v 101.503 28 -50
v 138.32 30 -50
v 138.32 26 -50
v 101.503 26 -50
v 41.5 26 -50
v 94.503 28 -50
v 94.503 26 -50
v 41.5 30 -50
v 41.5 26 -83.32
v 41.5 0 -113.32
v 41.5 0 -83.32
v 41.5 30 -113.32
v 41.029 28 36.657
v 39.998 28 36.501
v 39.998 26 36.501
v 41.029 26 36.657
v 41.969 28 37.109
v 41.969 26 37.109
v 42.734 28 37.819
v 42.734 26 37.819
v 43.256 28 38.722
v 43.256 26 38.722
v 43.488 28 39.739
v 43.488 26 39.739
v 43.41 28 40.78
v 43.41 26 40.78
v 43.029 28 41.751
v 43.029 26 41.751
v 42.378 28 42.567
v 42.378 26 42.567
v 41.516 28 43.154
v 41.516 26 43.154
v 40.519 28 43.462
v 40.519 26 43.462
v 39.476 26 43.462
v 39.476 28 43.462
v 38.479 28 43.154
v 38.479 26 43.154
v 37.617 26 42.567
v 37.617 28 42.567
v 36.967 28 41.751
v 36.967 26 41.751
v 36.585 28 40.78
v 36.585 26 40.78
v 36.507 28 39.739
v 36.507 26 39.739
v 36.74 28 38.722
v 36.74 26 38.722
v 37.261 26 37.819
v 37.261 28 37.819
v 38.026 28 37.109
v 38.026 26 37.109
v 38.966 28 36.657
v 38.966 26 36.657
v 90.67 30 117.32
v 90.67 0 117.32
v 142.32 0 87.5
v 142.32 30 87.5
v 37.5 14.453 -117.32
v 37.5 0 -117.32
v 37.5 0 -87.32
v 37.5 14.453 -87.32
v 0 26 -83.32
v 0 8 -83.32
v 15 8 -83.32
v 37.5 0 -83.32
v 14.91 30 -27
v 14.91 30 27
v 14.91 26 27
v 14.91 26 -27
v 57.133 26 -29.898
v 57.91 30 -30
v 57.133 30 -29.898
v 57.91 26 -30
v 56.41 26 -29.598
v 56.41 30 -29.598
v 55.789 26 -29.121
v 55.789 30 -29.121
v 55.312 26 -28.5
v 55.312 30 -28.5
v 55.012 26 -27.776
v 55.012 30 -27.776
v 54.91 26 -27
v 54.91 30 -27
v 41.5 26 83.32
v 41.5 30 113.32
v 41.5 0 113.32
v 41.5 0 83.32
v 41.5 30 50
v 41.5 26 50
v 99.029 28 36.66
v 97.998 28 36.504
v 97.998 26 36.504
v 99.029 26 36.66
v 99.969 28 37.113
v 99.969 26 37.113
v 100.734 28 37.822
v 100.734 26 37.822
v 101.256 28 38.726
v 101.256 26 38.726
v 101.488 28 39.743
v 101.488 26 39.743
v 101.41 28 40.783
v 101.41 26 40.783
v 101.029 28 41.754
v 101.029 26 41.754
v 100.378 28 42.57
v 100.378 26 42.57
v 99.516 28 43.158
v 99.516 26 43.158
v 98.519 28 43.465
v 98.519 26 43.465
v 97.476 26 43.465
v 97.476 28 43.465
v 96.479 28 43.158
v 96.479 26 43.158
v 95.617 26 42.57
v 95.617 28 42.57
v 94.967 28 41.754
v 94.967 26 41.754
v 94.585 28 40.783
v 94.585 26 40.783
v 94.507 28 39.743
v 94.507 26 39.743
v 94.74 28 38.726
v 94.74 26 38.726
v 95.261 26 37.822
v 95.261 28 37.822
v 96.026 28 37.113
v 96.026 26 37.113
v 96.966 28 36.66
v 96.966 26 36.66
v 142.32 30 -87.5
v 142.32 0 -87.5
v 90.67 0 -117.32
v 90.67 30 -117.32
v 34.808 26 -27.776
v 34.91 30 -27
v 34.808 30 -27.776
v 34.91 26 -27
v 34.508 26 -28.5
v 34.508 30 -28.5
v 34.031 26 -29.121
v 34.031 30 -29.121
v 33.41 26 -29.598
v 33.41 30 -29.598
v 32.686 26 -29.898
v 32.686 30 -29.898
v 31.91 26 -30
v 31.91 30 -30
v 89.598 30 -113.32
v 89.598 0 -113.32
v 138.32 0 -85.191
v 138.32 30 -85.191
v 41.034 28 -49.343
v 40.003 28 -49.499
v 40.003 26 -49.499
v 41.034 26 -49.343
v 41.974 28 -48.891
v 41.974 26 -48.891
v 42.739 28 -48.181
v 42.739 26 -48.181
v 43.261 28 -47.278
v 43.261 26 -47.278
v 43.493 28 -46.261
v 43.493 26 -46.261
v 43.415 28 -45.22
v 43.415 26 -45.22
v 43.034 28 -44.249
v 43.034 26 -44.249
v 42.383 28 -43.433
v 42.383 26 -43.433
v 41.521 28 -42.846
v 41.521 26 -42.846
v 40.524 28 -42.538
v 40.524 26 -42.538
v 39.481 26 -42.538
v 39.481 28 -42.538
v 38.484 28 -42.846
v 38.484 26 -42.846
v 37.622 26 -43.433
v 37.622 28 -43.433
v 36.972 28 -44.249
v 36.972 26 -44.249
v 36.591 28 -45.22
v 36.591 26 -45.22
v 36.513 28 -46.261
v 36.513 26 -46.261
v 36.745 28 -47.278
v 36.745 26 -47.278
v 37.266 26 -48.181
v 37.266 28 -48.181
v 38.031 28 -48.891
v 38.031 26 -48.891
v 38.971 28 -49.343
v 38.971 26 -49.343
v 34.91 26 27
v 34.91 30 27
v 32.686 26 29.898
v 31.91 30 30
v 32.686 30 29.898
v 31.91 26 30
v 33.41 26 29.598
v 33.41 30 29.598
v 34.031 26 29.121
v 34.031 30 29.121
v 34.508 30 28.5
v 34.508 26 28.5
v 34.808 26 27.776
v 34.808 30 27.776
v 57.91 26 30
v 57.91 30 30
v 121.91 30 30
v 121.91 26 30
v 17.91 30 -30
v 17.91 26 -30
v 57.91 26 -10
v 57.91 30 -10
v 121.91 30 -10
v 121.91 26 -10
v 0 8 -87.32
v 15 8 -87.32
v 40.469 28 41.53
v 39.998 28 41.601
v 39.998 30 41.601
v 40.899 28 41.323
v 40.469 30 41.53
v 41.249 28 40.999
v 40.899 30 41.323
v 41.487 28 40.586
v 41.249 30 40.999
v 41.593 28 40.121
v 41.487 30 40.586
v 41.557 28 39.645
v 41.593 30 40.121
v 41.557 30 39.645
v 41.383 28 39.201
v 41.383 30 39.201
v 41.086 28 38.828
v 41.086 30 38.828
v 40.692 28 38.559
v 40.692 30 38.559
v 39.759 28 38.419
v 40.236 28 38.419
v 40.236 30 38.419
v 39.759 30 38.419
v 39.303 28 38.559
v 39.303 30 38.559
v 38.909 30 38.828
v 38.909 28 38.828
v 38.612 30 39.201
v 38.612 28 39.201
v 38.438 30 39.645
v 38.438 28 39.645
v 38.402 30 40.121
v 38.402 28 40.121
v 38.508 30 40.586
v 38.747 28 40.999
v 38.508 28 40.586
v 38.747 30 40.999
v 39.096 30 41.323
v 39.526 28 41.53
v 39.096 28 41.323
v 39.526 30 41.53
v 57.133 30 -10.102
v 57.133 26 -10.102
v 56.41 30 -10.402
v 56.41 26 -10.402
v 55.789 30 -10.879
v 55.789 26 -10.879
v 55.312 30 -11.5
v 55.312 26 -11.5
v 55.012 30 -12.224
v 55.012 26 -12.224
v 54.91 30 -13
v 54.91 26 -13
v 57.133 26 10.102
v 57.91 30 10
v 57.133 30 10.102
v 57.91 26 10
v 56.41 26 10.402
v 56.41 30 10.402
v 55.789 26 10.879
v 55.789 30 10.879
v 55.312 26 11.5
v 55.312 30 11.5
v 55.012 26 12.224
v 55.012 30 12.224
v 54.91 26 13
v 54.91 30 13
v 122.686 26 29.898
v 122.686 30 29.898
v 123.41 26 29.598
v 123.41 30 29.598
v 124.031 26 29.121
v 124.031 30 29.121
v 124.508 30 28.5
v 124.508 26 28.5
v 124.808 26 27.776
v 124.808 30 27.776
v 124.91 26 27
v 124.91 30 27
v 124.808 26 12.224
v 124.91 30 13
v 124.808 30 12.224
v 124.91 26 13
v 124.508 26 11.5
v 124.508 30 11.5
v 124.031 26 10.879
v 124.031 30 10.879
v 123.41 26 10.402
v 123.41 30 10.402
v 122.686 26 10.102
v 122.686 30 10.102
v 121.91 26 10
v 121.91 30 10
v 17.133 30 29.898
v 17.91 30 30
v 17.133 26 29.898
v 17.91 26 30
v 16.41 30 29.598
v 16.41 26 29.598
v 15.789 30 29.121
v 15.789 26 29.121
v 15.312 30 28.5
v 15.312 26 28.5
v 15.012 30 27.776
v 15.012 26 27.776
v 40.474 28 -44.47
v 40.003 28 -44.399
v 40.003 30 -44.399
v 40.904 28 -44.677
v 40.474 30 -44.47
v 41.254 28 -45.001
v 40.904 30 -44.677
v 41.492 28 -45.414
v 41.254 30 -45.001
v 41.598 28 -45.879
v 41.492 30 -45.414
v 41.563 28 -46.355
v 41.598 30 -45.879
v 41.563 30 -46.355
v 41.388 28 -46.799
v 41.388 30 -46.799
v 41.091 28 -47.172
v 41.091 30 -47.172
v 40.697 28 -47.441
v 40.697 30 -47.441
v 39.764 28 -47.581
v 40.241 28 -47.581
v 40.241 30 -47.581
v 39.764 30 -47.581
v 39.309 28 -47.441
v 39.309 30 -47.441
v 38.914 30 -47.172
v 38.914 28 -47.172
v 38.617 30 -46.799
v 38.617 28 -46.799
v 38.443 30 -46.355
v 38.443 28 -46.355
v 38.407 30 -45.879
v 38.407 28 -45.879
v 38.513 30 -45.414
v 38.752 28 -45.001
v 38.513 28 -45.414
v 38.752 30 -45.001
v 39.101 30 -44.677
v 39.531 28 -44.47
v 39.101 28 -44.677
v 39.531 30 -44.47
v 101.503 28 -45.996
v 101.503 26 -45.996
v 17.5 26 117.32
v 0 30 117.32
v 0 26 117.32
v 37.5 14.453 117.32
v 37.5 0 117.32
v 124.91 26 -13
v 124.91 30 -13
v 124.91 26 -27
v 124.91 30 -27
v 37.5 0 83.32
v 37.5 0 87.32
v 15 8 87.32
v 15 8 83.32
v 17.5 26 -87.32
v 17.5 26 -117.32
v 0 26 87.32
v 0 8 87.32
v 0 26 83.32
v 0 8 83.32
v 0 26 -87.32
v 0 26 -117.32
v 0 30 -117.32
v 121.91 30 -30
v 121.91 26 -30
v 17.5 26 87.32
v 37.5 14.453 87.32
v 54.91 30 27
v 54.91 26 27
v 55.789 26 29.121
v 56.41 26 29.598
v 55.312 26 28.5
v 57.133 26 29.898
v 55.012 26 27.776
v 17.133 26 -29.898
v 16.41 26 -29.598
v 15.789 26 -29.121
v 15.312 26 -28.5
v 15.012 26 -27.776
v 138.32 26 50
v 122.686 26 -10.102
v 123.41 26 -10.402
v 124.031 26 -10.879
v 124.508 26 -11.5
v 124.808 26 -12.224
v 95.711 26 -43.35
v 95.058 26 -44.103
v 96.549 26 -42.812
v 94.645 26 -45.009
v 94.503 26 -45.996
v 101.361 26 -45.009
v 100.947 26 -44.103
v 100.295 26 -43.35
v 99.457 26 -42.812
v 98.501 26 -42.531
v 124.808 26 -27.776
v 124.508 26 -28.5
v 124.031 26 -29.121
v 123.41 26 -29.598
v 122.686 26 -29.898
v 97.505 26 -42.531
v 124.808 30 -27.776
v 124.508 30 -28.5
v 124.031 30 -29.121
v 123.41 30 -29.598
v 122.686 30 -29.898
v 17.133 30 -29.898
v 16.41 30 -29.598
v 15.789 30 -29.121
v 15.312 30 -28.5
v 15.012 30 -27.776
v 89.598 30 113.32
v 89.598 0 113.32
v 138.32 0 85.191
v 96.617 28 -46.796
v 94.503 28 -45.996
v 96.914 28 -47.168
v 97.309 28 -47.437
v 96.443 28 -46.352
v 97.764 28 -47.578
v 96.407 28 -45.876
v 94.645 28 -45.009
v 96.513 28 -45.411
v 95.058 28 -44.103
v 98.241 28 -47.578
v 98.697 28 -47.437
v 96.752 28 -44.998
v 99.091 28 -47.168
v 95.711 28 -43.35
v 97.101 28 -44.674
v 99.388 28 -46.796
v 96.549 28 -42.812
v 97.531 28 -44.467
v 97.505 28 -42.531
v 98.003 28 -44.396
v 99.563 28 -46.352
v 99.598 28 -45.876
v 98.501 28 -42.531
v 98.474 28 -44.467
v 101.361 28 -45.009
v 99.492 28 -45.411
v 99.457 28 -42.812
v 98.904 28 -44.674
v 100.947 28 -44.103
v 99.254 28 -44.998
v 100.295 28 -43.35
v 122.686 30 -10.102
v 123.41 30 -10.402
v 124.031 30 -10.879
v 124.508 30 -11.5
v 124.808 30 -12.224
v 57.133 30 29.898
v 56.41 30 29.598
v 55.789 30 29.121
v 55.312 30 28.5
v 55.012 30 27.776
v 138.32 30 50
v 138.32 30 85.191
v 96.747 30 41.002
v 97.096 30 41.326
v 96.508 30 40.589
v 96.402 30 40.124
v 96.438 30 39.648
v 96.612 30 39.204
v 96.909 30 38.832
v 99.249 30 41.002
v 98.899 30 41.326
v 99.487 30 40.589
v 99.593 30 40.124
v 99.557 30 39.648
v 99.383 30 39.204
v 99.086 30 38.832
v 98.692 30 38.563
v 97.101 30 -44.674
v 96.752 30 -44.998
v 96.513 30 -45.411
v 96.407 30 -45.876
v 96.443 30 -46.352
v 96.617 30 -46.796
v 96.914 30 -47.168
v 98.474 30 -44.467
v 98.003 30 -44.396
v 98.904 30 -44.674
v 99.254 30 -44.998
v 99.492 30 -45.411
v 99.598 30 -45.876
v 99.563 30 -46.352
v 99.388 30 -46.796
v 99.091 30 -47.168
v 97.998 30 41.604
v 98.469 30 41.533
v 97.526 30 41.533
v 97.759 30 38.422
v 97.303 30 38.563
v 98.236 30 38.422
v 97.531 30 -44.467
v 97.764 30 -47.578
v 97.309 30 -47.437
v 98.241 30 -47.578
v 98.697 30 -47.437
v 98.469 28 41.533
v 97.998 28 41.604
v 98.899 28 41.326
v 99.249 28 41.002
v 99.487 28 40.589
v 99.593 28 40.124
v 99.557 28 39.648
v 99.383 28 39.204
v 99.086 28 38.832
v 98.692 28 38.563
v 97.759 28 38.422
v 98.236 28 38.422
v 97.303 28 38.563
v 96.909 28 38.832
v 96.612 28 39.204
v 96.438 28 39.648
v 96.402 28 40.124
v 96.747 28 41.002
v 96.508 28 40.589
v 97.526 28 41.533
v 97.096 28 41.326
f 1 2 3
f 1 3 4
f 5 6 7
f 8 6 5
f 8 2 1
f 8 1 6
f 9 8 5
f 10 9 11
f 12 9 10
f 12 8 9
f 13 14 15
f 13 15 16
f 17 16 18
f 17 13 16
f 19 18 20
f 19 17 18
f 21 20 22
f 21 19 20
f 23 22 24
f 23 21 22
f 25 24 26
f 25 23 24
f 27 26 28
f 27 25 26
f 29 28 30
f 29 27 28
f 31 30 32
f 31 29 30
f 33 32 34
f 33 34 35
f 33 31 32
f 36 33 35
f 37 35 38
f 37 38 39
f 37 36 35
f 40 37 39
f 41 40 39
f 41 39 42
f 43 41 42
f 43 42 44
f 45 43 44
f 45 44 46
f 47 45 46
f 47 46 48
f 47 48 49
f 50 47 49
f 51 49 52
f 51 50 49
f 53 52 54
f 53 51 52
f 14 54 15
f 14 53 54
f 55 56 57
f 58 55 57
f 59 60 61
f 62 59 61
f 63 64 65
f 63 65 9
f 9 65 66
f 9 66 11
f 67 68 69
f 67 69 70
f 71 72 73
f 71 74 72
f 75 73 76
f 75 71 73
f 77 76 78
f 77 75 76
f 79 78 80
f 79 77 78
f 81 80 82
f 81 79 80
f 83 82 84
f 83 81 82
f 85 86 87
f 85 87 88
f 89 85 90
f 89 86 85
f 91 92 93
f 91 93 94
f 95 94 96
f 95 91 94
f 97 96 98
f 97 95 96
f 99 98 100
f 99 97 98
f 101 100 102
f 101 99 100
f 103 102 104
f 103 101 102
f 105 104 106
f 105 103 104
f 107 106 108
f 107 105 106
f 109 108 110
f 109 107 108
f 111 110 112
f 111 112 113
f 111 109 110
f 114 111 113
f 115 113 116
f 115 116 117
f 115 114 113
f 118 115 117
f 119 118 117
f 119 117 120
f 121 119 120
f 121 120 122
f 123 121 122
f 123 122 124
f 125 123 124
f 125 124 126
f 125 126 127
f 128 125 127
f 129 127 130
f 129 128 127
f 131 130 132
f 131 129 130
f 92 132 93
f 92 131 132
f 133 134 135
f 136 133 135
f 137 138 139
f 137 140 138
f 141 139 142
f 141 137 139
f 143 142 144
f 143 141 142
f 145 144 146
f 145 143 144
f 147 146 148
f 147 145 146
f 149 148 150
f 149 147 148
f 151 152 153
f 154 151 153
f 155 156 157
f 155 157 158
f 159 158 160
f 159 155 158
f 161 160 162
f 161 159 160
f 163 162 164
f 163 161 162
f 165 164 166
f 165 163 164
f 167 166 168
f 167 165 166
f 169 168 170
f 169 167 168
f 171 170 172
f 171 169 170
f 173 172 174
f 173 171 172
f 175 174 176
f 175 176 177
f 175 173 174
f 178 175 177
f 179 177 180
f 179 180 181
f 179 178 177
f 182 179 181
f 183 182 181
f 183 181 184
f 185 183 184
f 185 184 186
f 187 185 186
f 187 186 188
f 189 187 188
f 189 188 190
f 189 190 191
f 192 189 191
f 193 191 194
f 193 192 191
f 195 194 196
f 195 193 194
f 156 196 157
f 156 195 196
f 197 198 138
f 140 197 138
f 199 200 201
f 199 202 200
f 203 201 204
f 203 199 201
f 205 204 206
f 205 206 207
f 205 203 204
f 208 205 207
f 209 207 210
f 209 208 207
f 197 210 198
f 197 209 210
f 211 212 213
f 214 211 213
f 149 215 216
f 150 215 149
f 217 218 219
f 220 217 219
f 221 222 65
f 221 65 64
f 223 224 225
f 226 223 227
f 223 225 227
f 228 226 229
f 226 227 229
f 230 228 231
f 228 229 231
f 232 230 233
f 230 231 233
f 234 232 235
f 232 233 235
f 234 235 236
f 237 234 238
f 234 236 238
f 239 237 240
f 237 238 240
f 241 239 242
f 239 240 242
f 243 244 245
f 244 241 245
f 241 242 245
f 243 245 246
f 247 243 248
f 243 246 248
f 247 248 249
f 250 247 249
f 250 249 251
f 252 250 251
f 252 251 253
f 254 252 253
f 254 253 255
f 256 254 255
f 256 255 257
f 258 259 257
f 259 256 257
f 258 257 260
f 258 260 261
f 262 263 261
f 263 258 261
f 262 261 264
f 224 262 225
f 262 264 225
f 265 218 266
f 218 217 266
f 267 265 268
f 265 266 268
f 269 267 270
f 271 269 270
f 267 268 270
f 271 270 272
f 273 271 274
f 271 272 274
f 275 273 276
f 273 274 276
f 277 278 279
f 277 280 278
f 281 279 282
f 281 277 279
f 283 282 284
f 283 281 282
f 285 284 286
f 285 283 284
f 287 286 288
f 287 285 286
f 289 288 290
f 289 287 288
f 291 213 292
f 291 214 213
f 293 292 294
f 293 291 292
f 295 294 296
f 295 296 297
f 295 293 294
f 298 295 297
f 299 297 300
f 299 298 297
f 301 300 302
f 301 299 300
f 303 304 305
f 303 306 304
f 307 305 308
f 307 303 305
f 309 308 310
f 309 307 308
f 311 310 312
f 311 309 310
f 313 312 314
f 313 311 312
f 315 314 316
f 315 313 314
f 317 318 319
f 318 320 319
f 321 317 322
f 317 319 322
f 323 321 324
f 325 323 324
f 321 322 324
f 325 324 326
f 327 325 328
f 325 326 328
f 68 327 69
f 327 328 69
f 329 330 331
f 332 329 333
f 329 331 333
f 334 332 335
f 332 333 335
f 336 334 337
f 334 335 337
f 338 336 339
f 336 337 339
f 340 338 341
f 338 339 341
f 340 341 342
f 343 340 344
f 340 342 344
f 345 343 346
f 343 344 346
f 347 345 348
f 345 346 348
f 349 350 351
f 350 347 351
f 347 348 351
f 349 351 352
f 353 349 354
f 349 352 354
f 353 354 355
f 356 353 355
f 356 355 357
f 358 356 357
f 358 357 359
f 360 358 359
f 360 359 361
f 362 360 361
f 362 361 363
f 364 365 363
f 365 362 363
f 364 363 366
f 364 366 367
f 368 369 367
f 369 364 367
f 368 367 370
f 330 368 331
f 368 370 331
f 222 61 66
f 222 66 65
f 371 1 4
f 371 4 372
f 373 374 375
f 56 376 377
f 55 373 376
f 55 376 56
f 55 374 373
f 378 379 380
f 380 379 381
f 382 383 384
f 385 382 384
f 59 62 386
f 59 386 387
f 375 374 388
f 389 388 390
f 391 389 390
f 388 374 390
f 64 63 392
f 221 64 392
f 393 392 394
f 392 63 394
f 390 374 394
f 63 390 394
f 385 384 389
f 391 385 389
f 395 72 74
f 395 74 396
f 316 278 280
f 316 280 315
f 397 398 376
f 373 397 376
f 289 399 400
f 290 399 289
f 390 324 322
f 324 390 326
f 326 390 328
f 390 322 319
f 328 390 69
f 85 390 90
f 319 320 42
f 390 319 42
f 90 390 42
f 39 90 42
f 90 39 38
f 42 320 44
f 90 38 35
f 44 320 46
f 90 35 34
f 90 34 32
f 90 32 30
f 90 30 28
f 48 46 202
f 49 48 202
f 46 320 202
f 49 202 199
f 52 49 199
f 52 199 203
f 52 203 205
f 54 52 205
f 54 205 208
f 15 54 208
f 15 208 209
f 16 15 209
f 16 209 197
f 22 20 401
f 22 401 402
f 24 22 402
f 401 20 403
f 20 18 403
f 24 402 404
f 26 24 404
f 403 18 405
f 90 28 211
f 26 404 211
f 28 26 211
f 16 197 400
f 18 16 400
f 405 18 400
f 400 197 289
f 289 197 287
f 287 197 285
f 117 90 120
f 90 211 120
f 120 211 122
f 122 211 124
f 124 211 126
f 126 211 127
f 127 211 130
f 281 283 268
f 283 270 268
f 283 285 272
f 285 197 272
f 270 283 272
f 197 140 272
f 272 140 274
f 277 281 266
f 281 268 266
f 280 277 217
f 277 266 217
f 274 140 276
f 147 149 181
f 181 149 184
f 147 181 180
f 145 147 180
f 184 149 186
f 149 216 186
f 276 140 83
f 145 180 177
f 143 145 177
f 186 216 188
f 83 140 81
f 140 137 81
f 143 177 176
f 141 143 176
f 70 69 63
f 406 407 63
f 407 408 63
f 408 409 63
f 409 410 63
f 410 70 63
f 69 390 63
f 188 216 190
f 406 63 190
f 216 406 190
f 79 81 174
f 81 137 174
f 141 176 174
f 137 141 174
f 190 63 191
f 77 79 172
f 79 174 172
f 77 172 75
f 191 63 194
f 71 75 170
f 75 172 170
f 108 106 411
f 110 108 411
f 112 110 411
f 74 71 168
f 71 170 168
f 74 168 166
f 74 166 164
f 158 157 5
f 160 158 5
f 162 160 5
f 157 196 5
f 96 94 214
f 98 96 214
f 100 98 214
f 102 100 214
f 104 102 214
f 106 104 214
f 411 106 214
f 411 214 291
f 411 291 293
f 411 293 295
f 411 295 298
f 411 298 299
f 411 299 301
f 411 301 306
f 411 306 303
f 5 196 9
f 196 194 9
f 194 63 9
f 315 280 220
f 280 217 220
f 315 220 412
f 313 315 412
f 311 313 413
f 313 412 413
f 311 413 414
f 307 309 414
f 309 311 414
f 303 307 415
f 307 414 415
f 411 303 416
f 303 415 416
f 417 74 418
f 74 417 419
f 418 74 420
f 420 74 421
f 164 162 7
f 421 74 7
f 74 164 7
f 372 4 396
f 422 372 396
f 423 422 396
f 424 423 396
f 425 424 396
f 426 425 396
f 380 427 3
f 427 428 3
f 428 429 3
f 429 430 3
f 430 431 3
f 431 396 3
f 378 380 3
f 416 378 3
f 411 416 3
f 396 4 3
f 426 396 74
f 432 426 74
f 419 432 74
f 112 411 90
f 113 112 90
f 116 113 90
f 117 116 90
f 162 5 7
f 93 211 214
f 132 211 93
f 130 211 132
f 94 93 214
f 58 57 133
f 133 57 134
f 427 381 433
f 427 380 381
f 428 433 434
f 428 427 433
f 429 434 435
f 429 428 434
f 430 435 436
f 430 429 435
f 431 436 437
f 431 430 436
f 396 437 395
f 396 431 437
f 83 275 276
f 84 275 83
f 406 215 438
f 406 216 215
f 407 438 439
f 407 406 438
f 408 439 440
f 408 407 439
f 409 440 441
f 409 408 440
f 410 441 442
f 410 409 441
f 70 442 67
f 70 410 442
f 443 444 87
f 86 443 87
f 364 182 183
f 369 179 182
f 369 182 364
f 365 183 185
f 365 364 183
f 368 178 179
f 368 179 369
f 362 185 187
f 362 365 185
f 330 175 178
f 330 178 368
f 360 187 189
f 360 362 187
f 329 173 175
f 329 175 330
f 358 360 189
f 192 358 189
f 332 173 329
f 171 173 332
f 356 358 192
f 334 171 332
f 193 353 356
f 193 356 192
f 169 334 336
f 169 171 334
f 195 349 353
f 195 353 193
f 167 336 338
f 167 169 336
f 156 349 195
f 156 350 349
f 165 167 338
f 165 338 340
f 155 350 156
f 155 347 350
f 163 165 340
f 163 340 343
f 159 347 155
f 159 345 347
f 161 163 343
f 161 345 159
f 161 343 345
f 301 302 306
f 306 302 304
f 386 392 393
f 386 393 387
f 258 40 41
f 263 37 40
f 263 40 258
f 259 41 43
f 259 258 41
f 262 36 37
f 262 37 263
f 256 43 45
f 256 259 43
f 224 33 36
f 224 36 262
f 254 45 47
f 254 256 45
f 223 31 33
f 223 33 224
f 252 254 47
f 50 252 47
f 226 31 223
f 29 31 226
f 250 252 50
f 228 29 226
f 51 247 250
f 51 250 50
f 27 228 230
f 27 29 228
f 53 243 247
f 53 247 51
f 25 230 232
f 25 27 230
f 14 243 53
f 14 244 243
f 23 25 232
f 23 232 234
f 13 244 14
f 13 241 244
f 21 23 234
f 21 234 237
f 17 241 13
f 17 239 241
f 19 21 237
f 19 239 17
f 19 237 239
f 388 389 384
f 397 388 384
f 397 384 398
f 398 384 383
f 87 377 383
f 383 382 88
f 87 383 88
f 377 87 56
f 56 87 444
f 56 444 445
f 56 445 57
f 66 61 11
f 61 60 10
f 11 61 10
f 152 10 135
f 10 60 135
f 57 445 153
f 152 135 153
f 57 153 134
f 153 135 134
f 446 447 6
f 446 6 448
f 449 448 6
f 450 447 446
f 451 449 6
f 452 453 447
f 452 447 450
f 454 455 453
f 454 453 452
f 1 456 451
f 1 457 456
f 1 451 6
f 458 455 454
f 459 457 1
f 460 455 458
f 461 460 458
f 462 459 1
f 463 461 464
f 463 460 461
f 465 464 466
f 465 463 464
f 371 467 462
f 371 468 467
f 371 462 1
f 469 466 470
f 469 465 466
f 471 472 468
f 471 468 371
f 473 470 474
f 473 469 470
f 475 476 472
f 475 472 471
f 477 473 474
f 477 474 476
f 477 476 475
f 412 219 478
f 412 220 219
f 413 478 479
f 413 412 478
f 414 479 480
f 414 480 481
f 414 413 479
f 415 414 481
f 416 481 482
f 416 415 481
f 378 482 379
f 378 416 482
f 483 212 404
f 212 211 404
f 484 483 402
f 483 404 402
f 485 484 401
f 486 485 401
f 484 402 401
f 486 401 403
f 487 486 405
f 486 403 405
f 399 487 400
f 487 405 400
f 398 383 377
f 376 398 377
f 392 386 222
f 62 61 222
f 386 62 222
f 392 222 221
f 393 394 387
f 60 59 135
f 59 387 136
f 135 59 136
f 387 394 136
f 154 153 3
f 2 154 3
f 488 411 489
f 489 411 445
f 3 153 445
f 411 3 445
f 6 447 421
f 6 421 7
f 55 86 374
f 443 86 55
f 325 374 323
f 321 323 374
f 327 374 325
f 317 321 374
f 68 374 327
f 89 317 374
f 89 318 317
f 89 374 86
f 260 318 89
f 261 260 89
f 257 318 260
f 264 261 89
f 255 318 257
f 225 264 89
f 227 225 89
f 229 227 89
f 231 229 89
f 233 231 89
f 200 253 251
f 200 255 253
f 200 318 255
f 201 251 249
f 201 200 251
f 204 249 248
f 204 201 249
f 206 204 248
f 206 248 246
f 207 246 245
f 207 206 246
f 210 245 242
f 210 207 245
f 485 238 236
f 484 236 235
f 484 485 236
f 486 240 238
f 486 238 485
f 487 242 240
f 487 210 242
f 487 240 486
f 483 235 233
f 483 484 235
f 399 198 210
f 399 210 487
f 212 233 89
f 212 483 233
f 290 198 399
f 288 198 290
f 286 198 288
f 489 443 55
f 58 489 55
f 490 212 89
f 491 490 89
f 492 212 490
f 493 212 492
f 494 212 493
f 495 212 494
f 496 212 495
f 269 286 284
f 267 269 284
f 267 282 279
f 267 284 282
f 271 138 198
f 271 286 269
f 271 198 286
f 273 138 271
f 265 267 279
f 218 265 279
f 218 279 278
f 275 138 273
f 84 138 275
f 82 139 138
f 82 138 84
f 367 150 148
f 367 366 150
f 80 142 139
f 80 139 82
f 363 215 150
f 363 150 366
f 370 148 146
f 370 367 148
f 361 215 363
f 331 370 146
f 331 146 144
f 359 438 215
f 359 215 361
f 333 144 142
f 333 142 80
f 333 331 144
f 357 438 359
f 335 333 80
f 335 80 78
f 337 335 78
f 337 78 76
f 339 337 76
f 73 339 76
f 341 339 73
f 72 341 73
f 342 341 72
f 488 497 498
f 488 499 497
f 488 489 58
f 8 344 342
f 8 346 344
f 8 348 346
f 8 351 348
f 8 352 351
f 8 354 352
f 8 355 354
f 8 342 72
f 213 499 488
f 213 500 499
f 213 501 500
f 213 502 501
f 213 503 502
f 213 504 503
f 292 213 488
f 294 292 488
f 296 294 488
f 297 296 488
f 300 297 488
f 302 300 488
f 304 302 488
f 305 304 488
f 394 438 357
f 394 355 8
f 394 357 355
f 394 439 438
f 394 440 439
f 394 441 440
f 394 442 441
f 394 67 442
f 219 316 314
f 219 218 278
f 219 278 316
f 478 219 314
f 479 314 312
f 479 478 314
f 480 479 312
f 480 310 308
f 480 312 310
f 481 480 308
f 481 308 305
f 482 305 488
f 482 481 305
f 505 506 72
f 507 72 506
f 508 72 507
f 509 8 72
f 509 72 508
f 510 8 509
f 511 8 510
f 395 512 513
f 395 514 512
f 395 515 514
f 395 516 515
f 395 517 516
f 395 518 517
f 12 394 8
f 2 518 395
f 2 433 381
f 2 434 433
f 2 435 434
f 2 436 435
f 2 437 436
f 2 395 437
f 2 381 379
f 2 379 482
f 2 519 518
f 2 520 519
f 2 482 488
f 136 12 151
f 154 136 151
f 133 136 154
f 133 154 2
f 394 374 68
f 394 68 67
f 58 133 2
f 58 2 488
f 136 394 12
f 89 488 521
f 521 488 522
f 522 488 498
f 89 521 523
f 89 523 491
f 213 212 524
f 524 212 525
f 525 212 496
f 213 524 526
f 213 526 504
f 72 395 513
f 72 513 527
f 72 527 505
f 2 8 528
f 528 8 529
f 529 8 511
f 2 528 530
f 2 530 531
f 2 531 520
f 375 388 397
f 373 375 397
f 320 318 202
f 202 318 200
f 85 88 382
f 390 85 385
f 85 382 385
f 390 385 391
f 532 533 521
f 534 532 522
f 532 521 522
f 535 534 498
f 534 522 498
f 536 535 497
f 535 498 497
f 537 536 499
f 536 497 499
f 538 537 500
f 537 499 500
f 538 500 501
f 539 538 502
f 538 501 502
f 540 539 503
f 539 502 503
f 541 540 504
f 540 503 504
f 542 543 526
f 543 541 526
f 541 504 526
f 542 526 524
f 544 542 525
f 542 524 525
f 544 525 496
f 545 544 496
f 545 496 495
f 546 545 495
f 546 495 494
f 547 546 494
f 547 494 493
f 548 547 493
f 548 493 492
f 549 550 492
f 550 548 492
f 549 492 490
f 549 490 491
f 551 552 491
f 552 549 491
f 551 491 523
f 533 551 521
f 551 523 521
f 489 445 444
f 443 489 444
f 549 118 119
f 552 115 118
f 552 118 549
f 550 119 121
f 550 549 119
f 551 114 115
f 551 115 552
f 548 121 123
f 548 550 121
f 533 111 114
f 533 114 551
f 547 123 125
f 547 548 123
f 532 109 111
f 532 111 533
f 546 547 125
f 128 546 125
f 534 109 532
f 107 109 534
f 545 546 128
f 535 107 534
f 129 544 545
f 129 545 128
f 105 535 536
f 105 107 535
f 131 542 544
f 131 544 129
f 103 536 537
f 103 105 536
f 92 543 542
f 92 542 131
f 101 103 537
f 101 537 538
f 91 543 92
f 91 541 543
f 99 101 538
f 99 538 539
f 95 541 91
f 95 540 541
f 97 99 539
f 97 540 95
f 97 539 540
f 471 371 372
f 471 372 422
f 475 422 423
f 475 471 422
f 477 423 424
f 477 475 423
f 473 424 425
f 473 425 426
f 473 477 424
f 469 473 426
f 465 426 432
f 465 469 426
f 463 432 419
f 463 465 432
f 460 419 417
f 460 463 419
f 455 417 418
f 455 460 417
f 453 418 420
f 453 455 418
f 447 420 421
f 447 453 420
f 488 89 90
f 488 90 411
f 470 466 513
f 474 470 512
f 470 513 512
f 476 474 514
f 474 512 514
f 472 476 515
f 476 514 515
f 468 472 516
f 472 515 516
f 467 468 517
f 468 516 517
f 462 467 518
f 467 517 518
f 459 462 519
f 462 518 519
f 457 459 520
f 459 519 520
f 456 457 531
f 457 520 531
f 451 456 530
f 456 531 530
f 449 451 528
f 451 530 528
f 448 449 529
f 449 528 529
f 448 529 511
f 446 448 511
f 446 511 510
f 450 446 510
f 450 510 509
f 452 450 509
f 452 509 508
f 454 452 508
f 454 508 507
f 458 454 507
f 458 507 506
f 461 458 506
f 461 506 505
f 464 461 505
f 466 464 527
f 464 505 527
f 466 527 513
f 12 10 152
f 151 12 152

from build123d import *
from OCP.BRepFilletAPI import BRepFilletAPI_MakeChamfer

# Parameters (mm, degrees)
BOSS_EXTRUDE1_DEPTH = 30
CUT_EXTRUDE1_REACH  = 253.063
SKETCH10_W          = 41.5
SKETCH10_H          = 34
BOSS_EXTRUDE3_DEPTH = 4
CHAMFER4_SIZE       = 20
CHAMFER4_SIZE2      = 11.547005384
SKETCH11_W          = 20.75
SKETCH11_H          = 166.64
BOSS_EXTRUDE4_DEPTH = 4
SKETCH12_W          = 20.75
SKETCH12_H          = 33.32
BOSS_EXTRUDE5_DEPTH = 4
SKETCH13_W          = 20
SKETCH13_H          = 60
SKETCH13_W_2        = 70
SKETCH13_H_2        = 20
CUT_EXTRUDE2_DEPTH  = 4
FILLET2_R           = 3
SKETCH14_R          = 1.6
CUT_EXTRUDE3_DEPTH  = 4
CUT_EXTRUDE4_START  = -2
SKETCH15_R          = 3.5
SKETCH15_R_2        = 1.6
CUT_EXTRUDE4_DEPTH  = 2


with BuildPart() as part:
    # Sketch6 → Boss-Extrude1 (new body)
    with BuildSketch(Plane(origin=(0, 0, 0), x_dir=(1, 0, 0), z_dir=(0, 1, 0))):
        Polygon((0, -87.32), (37.5, -87.32), (37.5, -117.32), (90.67, -117.32), (142.319755082, -87.5), (142.319755082, 87.5), (90.67, 117.32), (37.5, 117.32), (37.5, 87.32), (0, 87.32), (0, 83.32), (41.5, 83.32), (41.5, 113.32), (89.59820323, 113.32), (138.319755082, 85.190598923), (138.319755082, -85.190598923), (89.59820323, -113.32), (41.5, -113.32), (41.5, -83.32), (0, -83.32), align=None)
    extrude(amount=BOSS_EXTRUDE1_DEPTH)

    # Sketch9 → Cut-Extrude1 (cut, up to next)
    with BuildSketch(Plane.XY.offset(87.32), mode=Mode.PRIVATE) as cut_extrude1_sk1:
        Polygon((37.5, 0), (15, 8), (0, 8), (0, 0), align=None)
    cut_extrude1_tool1 = extrude(cut_extrude1_sk1.sketch, amount=-CUT_EXTRUDE1_REACH, mode=Mode.PRIVATE) & part.part
    cut_extrude1 = cut_extrude1_tool1.solids().sort_by_distance((13.928571, 3.428571, 87.32))[0]
    add(cut_extrude1, mode=Mode.SUBTRACT)

    # Sketch10 → Boss-Extrude3 (add)
    with BuildSketch(Plane(origin=(0, 30, 0), x_dir=(1, 0, 0), z_dir=(0, 1, 0))):
        with Locations((20.75, -100.32)):
            Rectangle(SKETCH10_W, SKETCH10_H)
    boss_extrude3 = extrude(amount=-BOSS_EXTRUDE3_DEPTH)

    # Mirror1: Cut-Extrude1, Boss-Extrude3 across plane
    add(cut_extrude1.mirror(Plane.XY), mode=Mode.SUBTRACT)
    add(boss_extrude3.mirror(Plane.XY))

    # Chamfer4: one chamfer whose edges measure the first distance from different faces: ONE call of the kernel's chamfer builder (chamfer() names one face for all edges)
    chamfer4_edges_1 = [part.edges().sort_by_distance(p)[0] for p in [
        (37.5, 26, -102.32),
    ]]
    chamfer4_side_1 = [part.faces().sort_by_distance(p)[0] for p in [
        (18.75, 26, -102.32),
    ]]
    chamfer4_edges_2 = [part.edges().sort_by_distance(p)[0] for p in [
        (37.5, 26, 102.32),
    ]]
    chamfer4_side_2 = [part.faces().sort_by_distance(p)[0] for p in [
        (18.75, 26, 102.32),
    ]]
    chamfer4 = BRepFilletAPI_MakeChamfer(part.part.solid().wrapped)
    for e in chamfer4_edges_1:
        chamfer4.Add(CHAMFER4_SIZE, CHAMFER4_SIZE2, e.wrapped, chamfer4_side_1[0].wrapped)  # the first distance lies on this face
    for e in chamfer4_edges_2:
        chamfer4.Add(CHAMFER4_SIZE, CHAMFER4_SIZE2, e.wrapped, chamfer4_side_2[0].wrapped)  # the first distance lies on this face
    add(Compound.cast(chamfer4.Shape()), mode=Mode.REPLACE)

    # Sketch11 → Boss-Extrude4 (add)
    with BuildSketch(Plane(origin=(0, 30, 0), x_dir=(1, 0, 0), z_dir=(0, 1, 0))):
        with Locations((10.375, 0)):
            Rectangle(SKETCH11_W, SKETCH11_H)
    extrude(amount=-BOSS_EXTRUDE4_DEPTH)

    # Sketch12 → Boss-Extrude5 (add)
    with BuildSketch(Plane(origin=(0, 30, 0), x_dir=(1, 0, 0), z_dir=(0, 1, 0))):
        Polygon((41.5, 50), (20.75, 50), (20.75, -50), (41.5, -50), (138.319755082, -50), (138.319755082, 50), align=None)
        with Locations((31.125, -66.66)):
            Rectangle(SKETCH12_W, SKETCH12_H)
        with Locations((31.125, 66.66)):
            Rectangle(SKETCH12_W, SKETCH12_H)
    extrude(amount=-BOSS_EXTRUDE5_DEPTH)

    # Sketch13 → Cut-Extrude2 (cut)
    with BuildSketch(Plane(origin=(0, 30, 0), x_dir=(1, 0, 0), z_dir=(0, 1, 0))):
        with Locations((24.909877541, 0)):
            Rectangle(SKETCH13_W, SKETCH13_H)
        with Locations((89.909877541, 20)):
            Rectangle(SKETCH13_W_2, SKETCH13_H_2)
        with Locations((89.909877541, -20)):
            Rectangle(SKETCH13_W_2, SKETCH13_H_2)
    extrude(amount=-CUT_EXTRUDE2_DEPTH, mode=Mode.SUBTRACT)

    # Fillet2
    fillet2_edges = [part.edges().sort_by_distance(p)[0] for p in [
        (54.909877541, 28, 30),
        (54.909877541, 28, 10),
        (124.909877541, 28, 10),
        (124.909877541, 28, 30),
        (34.909877541, 28, -30),
        (34.909877541, 28, 30),
        (14.909877541, 28, 30),
        (14.909877541, 28, -30),
        (54.909877541, 28, -10),
        (54.909877541, 28, -30),
        (124.909877541, 28, -30),
        (124.909877541, 28, -10),
    ]]
    fillet(fillet2_edges, radius=FILLET2_R)

    # Sketch14 → Cut-Extrude3 (cut)
    with BuildSketch(Plane(origin=(0, 30, 0), x_dir=(1, 0, 0), z_dir=(0, 1, 0))):
        with Locations(Location((39.997609887, -40.001015731, 0), (0, 0, 270))):
            Circle(SKETCH14_R)
        with Locations(Location((97.997609783, -40.004481411, 0), (0, 0, 270))):
            Circle(SKETCH14_R)
        with Locations(Location((40.002748653, 45.998984115, 0), (0, 0, 270))):
            Circle(SKETCH14_R)
        with Locations(Location((98.00274855, 45.995518435, 0), (0, 0, 270))):
            Circle(SKETCH14_R)
    extrude(amount=-CUT_EXTRUDE3_DEPTH, mode=Mode.SUBTRACT)

    # Sketch15 → Cut-Extrude4 (cut)
    # profile 1 of 8: a face of its own
    with BuildSketch(Plane.XZ.offset(-26).offset(CUT_EXTRUDE4_START)):
        with Locations(Location((40.002748653, -45.998984115, 0), (0, 0, 270))):
            Circle(SKETCH15_R)
        with Locations(Location((40.002748653, -45.998984115, 0), (0, 0, 90))):
            Circle(SKETCH15_R_2, mode=Mode.SUBTRACT)
    # profile 2 of 8: a face of its own
    with BuildSketch(Plane.XZ.offset(-26).offset(CUT_EXTRUDE4_START)):
        with BuildLine():
            Line((101.50274855, -50), (101.50274855, -45.995518435))
            ThreePointArc((101.50274855, -45.995518435), (98.00274855, -49.495518435), (94.50274855, -45.995518435))
            Line((94.50274855, -45.995518435), (94.50274855, -50))
            Line((94.50274855, -50), (101.50274855, -50))
        make_face()
    # profile 3 of 8: a face of its own
    with BuildSketch(Plane.XZ.offset(-26).offset(CUT_EXTRUDE4_START)):
        with BuildLine():
            ThreePointArc((94.50274855, -45.995518435), (98.00274855, -49.495518435), (101.50274855, -45.995518435))
            Line((101.50274855, -45.995518435), (99.60274855, -45.995518435))
            ThreePointArc((99.60274855, -45.995518435), (98.00274855, -47.595518435), (96.40274855, -45.995518435))
            Line((96.40274855, -45.995518435), (94.50274855, -45.995518435))
        make_face()
    # profile 4 of 8: a face of its own
    with BuildSketch(Plane.XZ.offset(-26).offset(CUT_EXTRUDE4_START)):
        with BuildLine():
            Line((99.60274855, -45.995518435), (101.50274855, -45.995518435))
            ThreePointArc((101.50274855, -45.995518435), (98.00274855, -42.495518435), (94.50274855, -45.995518435))
            Line((94.50274855, -45.995518435), (96.40274855, -45.995518435))
            ThreePointArc((96.40274855, -45.995518435), (98.00274855, -44.395518435), (99.60274855, -45.995518435))
        make_face()
    # profile 5 of 8: a face of its own
    with BuildSketch(Plane.XZ.offset(-26).offset(CUT_EXTRUDE4_START)):
        with BuildLine():
            ThreePointArc((94.50274855, -45.995518435), (98.00274855, -49.495518435), (101.50274855, -45.995518435))
            Line((101.50274855, -45.995518435), (99.60274855, -45.995518435))
            ThreePointArc((99.60274855, -45.995518435), (98.00274855, -47.595518435), (96.40274855, -45.995518435))
            Line((96.40274855, -45.995518435), (94.50274855, -45.995518435))
        make_face()
    # profile 6 of 8: a face of its own
    with BuildSketch(Plane.XZ.offset(-26).offset(CUT_EXTRUDE4_START)):
        with BuildLine():
            Line((99.60274855, -45.995518435), (101.50274855, -45.995518435))
            ThreePointArc((101.50274855, -45.995518435), (98.00274855, -42.495518435), (94.50274855, -45.995518435))
            Line((94.50274855, -45.995518435), (96.40274855, -45.995518435))
            ThreePointArc((96.40274855, -45.995518435), (98.00274855, -44.395518435), (99.60274855, -45.995518435))
        make_face()
    # profile 7 of 8: a face of its own
    with BuildSketch(Plane.XZ.offset(-26).offset(CUT_EXTRUDE4_START)):
        with Locations(Location((97.997609783, 40.004481411, 0), (0, 0, 270))):
            Circle(SKETCH15_R)
        with Locations(Location((97.997609783, 40.004481411, 0), (0, 0, 90))):
            Circle(SKETCH15_R_2, mode=Mode.SUBTRACT)
    # profile 8 of 8: a face of its own
    with BuildSketch(Plane.XZ.offset(-26).offset(CUT_EXTRUDE4_START)):
        with Locations(Location((39.997609887, 40.001015731, 0), (0, 0, 270))):
            Circle(SKETCH15_R)
        with Locations(Location((39.997609887, 40.001015731, 0), (0, 0, 90))):
            Circle(SKETCH15_R_2, mode=Mode.SUBTRACT)
    extrude(amount=CUT_EXTRUDE4_DEPTH, mode=Mode.SUBTRACT)


solid = part.part
